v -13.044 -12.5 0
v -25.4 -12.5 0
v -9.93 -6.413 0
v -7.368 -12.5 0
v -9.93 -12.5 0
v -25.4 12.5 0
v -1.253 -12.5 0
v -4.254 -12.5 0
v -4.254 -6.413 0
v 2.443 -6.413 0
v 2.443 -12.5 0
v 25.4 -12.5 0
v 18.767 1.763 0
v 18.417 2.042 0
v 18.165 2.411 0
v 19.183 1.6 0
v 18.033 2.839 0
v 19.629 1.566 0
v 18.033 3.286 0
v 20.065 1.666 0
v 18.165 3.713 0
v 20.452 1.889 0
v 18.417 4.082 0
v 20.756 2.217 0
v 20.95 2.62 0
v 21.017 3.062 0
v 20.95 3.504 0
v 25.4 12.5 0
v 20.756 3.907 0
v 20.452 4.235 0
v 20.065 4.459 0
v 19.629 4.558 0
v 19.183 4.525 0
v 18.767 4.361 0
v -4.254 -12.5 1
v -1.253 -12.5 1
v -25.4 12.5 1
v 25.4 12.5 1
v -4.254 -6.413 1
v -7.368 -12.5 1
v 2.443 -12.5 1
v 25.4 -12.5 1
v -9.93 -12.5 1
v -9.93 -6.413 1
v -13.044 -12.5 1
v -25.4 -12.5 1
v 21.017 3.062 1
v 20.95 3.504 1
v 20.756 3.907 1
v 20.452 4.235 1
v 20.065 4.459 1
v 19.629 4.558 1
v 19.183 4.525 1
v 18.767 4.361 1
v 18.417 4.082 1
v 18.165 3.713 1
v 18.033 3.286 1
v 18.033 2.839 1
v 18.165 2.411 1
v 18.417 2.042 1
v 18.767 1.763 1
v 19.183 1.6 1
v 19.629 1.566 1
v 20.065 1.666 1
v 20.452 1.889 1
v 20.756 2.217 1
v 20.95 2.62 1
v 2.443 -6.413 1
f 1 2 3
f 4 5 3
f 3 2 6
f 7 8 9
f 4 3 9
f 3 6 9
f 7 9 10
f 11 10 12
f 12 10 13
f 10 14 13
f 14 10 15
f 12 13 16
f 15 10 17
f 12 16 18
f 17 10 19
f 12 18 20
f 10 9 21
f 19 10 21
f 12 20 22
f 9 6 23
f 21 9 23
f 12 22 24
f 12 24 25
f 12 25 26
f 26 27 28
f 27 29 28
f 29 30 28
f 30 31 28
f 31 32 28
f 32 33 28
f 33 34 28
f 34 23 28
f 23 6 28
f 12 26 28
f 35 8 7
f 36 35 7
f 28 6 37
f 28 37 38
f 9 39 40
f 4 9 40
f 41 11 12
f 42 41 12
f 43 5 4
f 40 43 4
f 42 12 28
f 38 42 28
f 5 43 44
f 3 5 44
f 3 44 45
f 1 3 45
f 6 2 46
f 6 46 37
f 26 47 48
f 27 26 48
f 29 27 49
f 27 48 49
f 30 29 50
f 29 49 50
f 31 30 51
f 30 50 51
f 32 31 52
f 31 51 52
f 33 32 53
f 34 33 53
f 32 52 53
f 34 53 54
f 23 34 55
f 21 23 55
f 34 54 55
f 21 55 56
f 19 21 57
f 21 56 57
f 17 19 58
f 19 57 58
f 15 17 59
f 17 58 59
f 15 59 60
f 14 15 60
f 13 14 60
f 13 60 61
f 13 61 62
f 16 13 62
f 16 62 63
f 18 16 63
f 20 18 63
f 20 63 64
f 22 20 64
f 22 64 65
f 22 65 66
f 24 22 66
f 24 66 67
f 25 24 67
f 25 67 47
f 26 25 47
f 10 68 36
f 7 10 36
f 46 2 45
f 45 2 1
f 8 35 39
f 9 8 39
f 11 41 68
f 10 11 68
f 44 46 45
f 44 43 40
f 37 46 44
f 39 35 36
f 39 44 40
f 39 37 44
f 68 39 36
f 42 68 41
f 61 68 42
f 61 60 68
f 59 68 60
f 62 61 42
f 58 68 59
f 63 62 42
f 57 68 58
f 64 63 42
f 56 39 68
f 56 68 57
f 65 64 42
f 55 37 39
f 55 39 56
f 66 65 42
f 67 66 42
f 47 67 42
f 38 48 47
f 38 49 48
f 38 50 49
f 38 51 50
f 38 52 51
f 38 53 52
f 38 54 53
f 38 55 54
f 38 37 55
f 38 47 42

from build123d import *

# Parameters (mm, degrees)
F0_W     = 50.8
F0_H     = 25
F1_DEPTH = 1
F2_R     = 1.5
F3_DEPTH = 25
F5_DEPTH = 25


with BuildPart() as f1:
    # F0 (on Top) → F1 (new body)
    with BuildSketch(Plane.XY):
        Rectangle(F0_W, F0_H)
    extrude(amount=F1_DEPTH)

    # F2 (on face) → F3 (cut)
    with BuildSketch(Plane.XY.offset(1)):
        with Locations((19.516597, 3.062223)):
            Circle(F2_R)
    extrude(amount=-F3_DEPTH, mode=Mode.SUBTRACT)

    # F4 (on face) → F5 (cut)
    with BuildSketch(Plane.XY.offset(1)):
        Polygon((-4.253665, -6.413301), (-7.367644, -12.5), (-4.253665, -12.5), align=None)
        Polygon((2.443298, -6.413301), (-1.253027, -12.5), (2.443298, -12.5), align=None)
        Polygon((-9.930169, -6.413301), (-13.044149, -12.5), (-9.930169, -12.5), align=None)
    extrude(amount=-F5_DEPTH, mode=Mode.SUBTRACT)


solid = f1.part
